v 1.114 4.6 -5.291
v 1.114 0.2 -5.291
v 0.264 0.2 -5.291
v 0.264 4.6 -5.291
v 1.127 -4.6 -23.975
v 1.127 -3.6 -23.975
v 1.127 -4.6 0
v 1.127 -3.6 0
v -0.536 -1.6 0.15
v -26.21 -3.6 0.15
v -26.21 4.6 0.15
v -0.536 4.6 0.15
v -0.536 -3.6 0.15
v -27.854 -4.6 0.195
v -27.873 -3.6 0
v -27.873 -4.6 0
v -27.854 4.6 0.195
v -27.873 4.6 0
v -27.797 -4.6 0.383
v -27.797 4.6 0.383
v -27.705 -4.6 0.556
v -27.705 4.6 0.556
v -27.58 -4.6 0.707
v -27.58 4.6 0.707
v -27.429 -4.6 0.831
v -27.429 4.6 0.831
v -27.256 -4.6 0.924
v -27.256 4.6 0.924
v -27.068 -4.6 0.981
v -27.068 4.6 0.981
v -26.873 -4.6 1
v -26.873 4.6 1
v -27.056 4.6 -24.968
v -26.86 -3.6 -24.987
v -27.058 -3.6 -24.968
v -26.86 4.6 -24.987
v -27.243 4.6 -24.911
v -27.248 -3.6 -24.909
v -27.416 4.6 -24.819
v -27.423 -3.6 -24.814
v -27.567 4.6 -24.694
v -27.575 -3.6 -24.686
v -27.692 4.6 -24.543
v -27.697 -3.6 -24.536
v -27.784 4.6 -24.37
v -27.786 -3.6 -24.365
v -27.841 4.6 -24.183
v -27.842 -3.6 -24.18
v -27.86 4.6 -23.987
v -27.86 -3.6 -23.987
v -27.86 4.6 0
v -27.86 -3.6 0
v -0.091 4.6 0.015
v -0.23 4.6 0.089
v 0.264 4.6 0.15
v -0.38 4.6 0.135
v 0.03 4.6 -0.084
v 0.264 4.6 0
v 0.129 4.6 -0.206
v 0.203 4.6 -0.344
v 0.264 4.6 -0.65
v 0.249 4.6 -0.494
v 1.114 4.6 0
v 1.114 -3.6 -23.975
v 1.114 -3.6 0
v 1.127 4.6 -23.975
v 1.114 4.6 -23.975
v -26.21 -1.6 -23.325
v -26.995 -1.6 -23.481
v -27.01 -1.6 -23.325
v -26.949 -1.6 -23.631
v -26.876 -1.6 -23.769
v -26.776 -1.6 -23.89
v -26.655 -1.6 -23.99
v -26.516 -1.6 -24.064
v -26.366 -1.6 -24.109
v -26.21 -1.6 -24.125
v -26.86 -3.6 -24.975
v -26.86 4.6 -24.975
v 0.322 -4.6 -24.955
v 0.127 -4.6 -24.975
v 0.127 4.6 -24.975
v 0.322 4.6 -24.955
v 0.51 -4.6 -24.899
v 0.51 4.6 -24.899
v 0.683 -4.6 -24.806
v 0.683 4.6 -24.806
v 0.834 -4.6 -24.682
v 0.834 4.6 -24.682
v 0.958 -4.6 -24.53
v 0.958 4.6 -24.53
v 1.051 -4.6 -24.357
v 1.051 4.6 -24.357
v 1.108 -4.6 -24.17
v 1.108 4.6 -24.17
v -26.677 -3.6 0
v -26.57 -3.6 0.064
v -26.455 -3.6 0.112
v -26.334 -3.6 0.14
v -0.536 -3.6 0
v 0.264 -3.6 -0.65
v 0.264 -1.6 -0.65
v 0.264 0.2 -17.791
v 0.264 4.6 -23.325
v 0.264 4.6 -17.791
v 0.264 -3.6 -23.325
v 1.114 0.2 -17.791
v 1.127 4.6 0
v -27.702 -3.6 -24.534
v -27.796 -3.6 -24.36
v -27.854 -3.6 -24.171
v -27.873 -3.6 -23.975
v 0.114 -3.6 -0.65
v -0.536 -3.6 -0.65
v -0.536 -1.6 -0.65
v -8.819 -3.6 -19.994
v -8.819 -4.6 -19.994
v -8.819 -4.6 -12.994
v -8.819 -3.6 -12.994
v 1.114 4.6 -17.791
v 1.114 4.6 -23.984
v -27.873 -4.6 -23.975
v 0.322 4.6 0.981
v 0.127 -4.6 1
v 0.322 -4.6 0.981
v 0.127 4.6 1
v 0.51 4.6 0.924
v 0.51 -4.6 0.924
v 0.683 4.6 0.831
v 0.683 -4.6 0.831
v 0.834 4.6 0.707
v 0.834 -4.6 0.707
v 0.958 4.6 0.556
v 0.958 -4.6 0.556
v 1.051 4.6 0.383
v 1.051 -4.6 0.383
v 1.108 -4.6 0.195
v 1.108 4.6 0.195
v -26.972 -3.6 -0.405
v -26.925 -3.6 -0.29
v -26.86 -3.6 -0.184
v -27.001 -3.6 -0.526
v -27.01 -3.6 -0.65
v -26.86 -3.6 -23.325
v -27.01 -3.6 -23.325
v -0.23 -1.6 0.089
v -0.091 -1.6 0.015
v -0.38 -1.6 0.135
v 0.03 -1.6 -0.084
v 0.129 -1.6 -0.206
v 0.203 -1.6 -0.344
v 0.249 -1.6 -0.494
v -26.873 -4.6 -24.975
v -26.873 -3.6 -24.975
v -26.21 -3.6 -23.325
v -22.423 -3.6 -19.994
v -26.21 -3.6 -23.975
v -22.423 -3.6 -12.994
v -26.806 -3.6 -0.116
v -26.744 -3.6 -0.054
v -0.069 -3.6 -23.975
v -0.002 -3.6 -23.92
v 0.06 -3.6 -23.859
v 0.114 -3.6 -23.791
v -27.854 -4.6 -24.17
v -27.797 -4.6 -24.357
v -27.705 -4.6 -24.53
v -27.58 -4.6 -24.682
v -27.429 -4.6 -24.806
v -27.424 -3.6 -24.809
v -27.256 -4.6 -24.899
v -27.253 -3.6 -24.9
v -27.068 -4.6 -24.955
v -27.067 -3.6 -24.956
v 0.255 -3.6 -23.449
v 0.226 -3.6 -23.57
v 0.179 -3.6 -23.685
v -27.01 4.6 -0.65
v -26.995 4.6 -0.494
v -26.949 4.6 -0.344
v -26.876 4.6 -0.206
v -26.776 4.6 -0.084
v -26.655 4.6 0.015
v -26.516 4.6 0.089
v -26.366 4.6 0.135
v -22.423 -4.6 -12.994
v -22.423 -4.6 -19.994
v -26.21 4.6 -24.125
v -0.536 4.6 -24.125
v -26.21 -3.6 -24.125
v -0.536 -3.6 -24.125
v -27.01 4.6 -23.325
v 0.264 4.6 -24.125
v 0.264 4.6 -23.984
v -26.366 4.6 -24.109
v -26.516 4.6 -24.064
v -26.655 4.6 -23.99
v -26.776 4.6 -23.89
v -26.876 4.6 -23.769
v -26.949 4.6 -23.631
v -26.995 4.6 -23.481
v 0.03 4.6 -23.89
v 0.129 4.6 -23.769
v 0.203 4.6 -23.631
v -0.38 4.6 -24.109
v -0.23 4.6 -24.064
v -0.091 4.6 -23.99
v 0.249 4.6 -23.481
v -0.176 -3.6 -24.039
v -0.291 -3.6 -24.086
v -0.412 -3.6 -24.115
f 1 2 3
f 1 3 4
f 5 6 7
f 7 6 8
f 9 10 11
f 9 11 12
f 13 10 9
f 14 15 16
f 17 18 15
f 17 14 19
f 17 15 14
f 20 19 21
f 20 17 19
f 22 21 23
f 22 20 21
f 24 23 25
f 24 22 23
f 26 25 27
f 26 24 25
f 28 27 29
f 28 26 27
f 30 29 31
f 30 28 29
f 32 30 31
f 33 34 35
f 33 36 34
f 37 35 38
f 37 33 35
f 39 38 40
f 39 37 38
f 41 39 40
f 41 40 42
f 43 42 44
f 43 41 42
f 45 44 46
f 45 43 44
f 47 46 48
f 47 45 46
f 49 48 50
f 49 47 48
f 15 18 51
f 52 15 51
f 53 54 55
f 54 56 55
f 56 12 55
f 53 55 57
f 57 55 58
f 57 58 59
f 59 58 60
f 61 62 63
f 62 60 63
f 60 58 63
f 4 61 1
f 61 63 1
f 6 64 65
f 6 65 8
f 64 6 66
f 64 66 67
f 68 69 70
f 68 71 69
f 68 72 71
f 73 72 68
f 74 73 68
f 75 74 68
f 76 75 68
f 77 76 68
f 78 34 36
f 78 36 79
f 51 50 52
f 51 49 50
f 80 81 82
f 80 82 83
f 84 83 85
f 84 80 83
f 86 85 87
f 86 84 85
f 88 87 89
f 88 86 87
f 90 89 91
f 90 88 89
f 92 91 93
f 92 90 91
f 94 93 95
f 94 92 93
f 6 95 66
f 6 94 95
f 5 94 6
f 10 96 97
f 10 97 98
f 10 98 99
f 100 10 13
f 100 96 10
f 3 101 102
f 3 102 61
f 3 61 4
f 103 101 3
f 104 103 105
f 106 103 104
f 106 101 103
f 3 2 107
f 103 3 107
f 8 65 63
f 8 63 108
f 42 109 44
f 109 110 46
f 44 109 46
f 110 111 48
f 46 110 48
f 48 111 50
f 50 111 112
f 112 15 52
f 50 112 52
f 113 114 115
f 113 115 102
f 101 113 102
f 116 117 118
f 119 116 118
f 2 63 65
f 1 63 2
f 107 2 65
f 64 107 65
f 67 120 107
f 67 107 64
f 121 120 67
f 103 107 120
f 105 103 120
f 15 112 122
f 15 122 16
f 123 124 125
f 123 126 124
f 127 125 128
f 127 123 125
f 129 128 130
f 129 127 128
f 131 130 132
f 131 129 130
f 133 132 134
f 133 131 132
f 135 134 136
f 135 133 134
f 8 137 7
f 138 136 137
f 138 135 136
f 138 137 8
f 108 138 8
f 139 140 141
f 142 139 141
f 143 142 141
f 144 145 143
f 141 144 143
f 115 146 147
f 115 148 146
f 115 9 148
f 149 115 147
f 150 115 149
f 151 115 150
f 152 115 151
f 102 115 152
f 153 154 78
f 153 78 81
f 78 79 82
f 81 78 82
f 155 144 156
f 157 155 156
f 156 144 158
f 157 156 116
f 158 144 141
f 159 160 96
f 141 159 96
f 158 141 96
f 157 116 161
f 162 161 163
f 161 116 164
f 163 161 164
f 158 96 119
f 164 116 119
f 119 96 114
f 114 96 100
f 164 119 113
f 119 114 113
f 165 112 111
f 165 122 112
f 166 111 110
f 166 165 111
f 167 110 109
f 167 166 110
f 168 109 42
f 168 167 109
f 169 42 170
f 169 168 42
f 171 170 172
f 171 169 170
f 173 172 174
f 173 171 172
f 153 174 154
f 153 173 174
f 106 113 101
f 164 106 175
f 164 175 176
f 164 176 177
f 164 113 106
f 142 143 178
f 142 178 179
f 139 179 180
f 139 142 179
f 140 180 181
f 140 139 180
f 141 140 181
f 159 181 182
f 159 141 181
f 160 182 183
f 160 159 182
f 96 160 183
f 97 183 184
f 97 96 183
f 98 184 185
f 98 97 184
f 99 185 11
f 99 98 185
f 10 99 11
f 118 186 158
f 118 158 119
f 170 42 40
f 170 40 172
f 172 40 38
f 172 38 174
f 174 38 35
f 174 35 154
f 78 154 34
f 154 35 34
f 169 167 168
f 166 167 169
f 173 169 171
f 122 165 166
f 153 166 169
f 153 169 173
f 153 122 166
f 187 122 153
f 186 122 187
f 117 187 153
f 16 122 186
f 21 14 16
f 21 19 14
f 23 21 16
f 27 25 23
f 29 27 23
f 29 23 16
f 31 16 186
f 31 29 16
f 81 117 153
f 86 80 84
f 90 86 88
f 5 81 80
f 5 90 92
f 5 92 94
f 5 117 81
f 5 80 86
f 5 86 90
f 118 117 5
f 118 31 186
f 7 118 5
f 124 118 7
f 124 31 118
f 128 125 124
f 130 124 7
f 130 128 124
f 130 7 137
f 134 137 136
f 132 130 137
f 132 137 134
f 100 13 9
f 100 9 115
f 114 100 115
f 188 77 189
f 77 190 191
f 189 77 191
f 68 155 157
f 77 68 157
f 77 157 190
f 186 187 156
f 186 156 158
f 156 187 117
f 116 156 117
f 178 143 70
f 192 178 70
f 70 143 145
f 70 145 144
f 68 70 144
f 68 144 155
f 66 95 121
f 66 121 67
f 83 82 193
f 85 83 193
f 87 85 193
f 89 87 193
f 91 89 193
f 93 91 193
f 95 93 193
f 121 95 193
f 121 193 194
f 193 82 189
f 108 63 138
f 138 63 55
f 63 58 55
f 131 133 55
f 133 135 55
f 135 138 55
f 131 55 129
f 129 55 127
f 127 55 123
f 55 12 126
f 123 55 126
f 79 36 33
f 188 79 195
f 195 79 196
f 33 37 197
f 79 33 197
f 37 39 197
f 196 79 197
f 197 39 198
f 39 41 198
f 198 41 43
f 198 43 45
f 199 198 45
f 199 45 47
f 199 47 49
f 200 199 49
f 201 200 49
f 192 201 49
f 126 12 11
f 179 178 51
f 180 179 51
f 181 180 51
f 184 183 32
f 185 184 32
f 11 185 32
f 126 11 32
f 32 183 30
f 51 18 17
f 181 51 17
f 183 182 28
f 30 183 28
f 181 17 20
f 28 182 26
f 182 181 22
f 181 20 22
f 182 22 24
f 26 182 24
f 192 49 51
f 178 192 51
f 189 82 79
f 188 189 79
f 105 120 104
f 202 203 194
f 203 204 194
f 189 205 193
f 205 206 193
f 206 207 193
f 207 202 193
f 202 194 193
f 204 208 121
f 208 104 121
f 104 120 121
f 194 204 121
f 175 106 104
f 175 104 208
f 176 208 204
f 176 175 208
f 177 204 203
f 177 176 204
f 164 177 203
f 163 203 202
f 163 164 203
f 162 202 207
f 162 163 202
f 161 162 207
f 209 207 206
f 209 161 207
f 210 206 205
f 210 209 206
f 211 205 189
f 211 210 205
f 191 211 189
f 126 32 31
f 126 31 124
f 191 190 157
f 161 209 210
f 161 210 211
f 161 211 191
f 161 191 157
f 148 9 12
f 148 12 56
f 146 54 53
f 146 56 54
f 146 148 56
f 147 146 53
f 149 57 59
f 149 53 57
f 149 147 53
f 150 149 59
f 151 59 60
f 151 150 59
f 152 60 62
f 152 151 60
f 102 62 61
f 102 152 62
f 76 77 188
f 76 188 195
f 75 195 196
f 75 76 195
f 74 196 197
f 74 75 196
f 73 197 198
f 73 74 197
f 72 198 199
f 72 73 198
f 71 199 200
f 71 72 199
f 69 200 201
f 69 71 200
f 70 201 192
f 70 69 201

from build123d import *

# Parameters (mm, degrees)
SKETCH_1_W          = 29.00004826
SKETCH_1_H          = 8.2
EXTRUDE_1_DEPTH     = 1
SKETCH_3_W          = 24.987345695
SKETCH_3_H          = 8.2
EXTRUDE_2_DEPTH     = 1
SKETCH_4_W          = 27.987350775
SKETCH_4_H          = 8.2
EXTRUDE_3_DEPTH     = 1
SKETCH_6_W          = 23.983586282
SKETCH_6_H          = 8.2
EXTRUDE_4_DEPTH     = 1
SKETCH_9_W          = 12.5
SKETCH_9_H          = 4.4
CUT_EXTRUDE_1_DEPTH = 1
SKETCH_10_W         = 29.00004826
SKETCH_10_H         = 25.974648209
EXTRUDE_5_DEPTH     = 1
SKETCH_11_W         = 13.604013208
SKETCH_11_H         = 7
CUT_EXTRUDE_3_DEPTH = 1
FILLET_1_R          = 1
FILLET_2_R          = 1
CUT_EXTRUDE_START   = -8.200051
SKETCH_12_W         = 27.27465329
SKETCH_12_H         = 24.274648209
SKETCH_12_W_2       = 26.97465329
SKETCH_12_H_2       = 23.974648209
CUT_EXTRUDE_4_DEPTH = 8.200051
EXTRUDE_START       = -5.1e-05
SKETCH_14_W         = 0.8
SKETCH_14_H         = 0.8
EXTRUDE_6_DEPTH     = 2
FILLET_3_R          = 0.8


# Some blends are built 0.0001 mm under size
with BuildPart() as part:
    # 草图1 → 凸台-拉伸1 (new body)
    with BuildSketch(Plane.XY):
        with Locations((-13.373026416, 0.4999492)):
            Rectangle(SKETCH_1_W, SKETCH_1_H)
    extrude(amount=EXTRUDE_1_DEPTH)

    # 草图3 → 凸台-拉伸2 (add)
    with BuildSketch(Plane.ZY.offset(26.860353061)):
        with Locations((-12.493672848, 0.4999492)):
            Rectangle(SKETCH_3_W, SKETCH_3_H)
    extrude(amount=EXTRUDE_2_DEPTH)

    # 草图4 → 凸台-拉伸3 (add)
    with BuildSketch(Plane(origin=(0, 0, -23.974648209), x_dir=(-1, 0, 0), z_dir=(0, 0, -1))):
        with Locations((12.866677673, 0.4999492)):
            Rectangle(SKETCH_4_W, SKETCH_4_H)
    extrude(amount=EXTRUDE_3_DEPTH)

    # 草图6 → 凸台-拉伸4 (add)
    with BuildSketch(Plane(origin=(0.114300229, 0, 0), x_dir=(0, 0, -1), z_dir=(1, 0, 0))):
        with Locations((11.991793141, 0.5)):
            Rectangle(SKETCH_6_W, SKETCH_6_H)
    extrude(amount=EXTRUDE_4_DEPTH)

    # 草图9 → 切除-拉伸1 (cut)
    with BuildSketch(Plane(origin=(1.114300229, 0, 0), x_dir=(0, 0, -1), z_dir=(1, 0, 0))):
        with Locations((11.541221742, 2.4)):
            Rectangle(SKETCH_9_W, SKETCH_9_H)
    extrude(amount=-CUT_EXTRUDE_1_DEPTH, mode=Mode.SUBTRACT)

    # 草图10 → 凸台-拉伸5 (add)
    with BuildSketch(Plane.XZ.offset(3.6)):
        with Locations((-13.373026416, -11.987324105)):
            Rectangle(SKETCH_10_W, SKETCH_10_H)
    extrude(amount=EXTRUDE_5_DEPTH)

    # 草图11 → 切除-拉伸3 (cut)
    with BuildSketch(Plane.XZ.offset(4.6)):
        with Locations((-15.621031242, -16.494333249)):
            Rectangle(SKETCH_11_W, SKETCH_11_H)
    extrude(amount=-CUT_EXTRUDE_3_DEPTH, mode=Mode.SUBTRACT)

    # 圆角1
    fillet_1_edges = [part.edges().sort_by_distance(p)[0] for p in [
        (1.126997714, -2.54e-05, -24.974648209),
        (1.126997714, -2.54e-05, 1),
        (-27.873050546, -2.54e-05, 1),
        (-27.873050546, -4.1, -24.974648209),
    ]]
    fillet(fillet_1_edges, radius=FILLET_1_R)

    # 圆角2
    fillet_2_edges = [part.edges().sort_by_distance(p)[0] for p in [
        (-27.860353061, 0.4999492, -24.987345695),
    ]]
    fillet(fillet_2_edges, radius=FILLET_2_R - 0.0001)  # a hair under: the kernel refuses the full size

    # 草图12 → 切除-拉伸4 (cut)
    with BuildSketch(Plane(origin=(0, 4.6, 0), x_dir=(1, 0, 0), z_dir=(0, 1, 0)).offset(CUT_EXTRUDE_START)):
        with Locations((-13.373026416, 11.987324105)):
            Rectangle(SKETCH_12_W, SKETCH_12_H)
        with Locations((-13.373026416, 11.987324105)):
            Rectangle(SKETCH_12_W_2, SKETCH_12_H_2, mode=Mode.SUBTRACT)
    extrude(amount=CUT_EXTRUDE_4_DEPTH, mode=Mode.SUBTRACT)

    # 草图14 → 凸台-拉伸6 (add)
    with BuildSketch(Plane(origin=(0, -3.6, 0), x_dir=(1, 0, 0), z_dir=(0, 1, 0)).offset(EXTRUDE_START)):
        with Locations((-26.610353061, 23.724648209)):
            Rectangle(SKETCH_14_W, SKETCH_14_H)
        with Locations((-0.135699771, 0.25)):
            Rectangle(SKETCH_14_W, SKETCH_14_H)
    extrude(amount=EXTRUDE_6_DEPTH)

    # 圆角3
    # the kernel refuses this fillet: 0.8 mm, written as the material it adds along each edge
    with BuildSketch(Plane(origin=(-27.010353061, -3.600051, 0.15), x_dir=(0, 0, -1), z_dir=(0, 1, 0)), Plane(origin=(-27.010353061, -3.600051, -24.124648209), x_dir=(1, 0, 0), z_dir=(0, 1, 0))) as fillet_3_piece_1:
        with BuildLine():
            CenterArc((FILLET_3_R, -FILLET_3_R), FILLET_3_R, 90, 90)
            Line((0, -FILLET_3_R), (0, 0))
            Line((0, 0), (FILLET_3_R, 0))
        make_face()
    extrude(amount=8.2000002)
    with BuildSketch(Plane(origin=(0.264300229, -3.600051, 0.15), x_dir=(0, 0, -1), z_dir=(0, 1, 0))) as fillet_3_piece_2_section:
        with BuildLine():
            CenterArc((FILLET_3_R, FILLET_3_R), FILLET_3_R, 180, 90)
            Line((0, FILLET_3_R), (0, 0))
            Line((0, 0), (FILLET_3_R, 0))
        make_face()
    fillet_3_piece_2 = extrude(amount=10.2000002, mode=Mode.PRIVATE)
    fillet_3_piece_2 = split(fillet_3_piece_2, bisect_by=Plane(origin=(0.183426008, 4.6, -0.178427163), z_dir=(0, -1, 0)), keep=Keep.TOP, mode=Mode.PRIVATE)
    add(fillet_3_piece_2)
    with BuildSketch(Plane(origin=(0.264300229, -3.600051, -24.124648209), x_dir=(0, 0, 1), z_dir=(0, 1, 0))) as fillet_3_piece_3_section:
        with BuildLine():
            CenterArc((FILLET_3_R, -FILLET_3_R), FILLET_3_R, 90, 90)
            Line((0, -FILLET_3_R), (0, 0))
            Line((0, 0), (FILLET_3_R, 0))
        make_face()
    fillet_3_piece_3 = extrude(amount=10.2000002, mode=Mode.PRIVATE)
    fillet_3_piece_3 = split(fillet_3_piece_3, bisect_by=Plane(origin=(0.180139074, 4.6, -23.803633202), z_dir=(0, -1, 0)), keep=Keep.TOP, mode=Mode.PRIVATE)
    add(fillet_3_piece_3)


solid = part.part
